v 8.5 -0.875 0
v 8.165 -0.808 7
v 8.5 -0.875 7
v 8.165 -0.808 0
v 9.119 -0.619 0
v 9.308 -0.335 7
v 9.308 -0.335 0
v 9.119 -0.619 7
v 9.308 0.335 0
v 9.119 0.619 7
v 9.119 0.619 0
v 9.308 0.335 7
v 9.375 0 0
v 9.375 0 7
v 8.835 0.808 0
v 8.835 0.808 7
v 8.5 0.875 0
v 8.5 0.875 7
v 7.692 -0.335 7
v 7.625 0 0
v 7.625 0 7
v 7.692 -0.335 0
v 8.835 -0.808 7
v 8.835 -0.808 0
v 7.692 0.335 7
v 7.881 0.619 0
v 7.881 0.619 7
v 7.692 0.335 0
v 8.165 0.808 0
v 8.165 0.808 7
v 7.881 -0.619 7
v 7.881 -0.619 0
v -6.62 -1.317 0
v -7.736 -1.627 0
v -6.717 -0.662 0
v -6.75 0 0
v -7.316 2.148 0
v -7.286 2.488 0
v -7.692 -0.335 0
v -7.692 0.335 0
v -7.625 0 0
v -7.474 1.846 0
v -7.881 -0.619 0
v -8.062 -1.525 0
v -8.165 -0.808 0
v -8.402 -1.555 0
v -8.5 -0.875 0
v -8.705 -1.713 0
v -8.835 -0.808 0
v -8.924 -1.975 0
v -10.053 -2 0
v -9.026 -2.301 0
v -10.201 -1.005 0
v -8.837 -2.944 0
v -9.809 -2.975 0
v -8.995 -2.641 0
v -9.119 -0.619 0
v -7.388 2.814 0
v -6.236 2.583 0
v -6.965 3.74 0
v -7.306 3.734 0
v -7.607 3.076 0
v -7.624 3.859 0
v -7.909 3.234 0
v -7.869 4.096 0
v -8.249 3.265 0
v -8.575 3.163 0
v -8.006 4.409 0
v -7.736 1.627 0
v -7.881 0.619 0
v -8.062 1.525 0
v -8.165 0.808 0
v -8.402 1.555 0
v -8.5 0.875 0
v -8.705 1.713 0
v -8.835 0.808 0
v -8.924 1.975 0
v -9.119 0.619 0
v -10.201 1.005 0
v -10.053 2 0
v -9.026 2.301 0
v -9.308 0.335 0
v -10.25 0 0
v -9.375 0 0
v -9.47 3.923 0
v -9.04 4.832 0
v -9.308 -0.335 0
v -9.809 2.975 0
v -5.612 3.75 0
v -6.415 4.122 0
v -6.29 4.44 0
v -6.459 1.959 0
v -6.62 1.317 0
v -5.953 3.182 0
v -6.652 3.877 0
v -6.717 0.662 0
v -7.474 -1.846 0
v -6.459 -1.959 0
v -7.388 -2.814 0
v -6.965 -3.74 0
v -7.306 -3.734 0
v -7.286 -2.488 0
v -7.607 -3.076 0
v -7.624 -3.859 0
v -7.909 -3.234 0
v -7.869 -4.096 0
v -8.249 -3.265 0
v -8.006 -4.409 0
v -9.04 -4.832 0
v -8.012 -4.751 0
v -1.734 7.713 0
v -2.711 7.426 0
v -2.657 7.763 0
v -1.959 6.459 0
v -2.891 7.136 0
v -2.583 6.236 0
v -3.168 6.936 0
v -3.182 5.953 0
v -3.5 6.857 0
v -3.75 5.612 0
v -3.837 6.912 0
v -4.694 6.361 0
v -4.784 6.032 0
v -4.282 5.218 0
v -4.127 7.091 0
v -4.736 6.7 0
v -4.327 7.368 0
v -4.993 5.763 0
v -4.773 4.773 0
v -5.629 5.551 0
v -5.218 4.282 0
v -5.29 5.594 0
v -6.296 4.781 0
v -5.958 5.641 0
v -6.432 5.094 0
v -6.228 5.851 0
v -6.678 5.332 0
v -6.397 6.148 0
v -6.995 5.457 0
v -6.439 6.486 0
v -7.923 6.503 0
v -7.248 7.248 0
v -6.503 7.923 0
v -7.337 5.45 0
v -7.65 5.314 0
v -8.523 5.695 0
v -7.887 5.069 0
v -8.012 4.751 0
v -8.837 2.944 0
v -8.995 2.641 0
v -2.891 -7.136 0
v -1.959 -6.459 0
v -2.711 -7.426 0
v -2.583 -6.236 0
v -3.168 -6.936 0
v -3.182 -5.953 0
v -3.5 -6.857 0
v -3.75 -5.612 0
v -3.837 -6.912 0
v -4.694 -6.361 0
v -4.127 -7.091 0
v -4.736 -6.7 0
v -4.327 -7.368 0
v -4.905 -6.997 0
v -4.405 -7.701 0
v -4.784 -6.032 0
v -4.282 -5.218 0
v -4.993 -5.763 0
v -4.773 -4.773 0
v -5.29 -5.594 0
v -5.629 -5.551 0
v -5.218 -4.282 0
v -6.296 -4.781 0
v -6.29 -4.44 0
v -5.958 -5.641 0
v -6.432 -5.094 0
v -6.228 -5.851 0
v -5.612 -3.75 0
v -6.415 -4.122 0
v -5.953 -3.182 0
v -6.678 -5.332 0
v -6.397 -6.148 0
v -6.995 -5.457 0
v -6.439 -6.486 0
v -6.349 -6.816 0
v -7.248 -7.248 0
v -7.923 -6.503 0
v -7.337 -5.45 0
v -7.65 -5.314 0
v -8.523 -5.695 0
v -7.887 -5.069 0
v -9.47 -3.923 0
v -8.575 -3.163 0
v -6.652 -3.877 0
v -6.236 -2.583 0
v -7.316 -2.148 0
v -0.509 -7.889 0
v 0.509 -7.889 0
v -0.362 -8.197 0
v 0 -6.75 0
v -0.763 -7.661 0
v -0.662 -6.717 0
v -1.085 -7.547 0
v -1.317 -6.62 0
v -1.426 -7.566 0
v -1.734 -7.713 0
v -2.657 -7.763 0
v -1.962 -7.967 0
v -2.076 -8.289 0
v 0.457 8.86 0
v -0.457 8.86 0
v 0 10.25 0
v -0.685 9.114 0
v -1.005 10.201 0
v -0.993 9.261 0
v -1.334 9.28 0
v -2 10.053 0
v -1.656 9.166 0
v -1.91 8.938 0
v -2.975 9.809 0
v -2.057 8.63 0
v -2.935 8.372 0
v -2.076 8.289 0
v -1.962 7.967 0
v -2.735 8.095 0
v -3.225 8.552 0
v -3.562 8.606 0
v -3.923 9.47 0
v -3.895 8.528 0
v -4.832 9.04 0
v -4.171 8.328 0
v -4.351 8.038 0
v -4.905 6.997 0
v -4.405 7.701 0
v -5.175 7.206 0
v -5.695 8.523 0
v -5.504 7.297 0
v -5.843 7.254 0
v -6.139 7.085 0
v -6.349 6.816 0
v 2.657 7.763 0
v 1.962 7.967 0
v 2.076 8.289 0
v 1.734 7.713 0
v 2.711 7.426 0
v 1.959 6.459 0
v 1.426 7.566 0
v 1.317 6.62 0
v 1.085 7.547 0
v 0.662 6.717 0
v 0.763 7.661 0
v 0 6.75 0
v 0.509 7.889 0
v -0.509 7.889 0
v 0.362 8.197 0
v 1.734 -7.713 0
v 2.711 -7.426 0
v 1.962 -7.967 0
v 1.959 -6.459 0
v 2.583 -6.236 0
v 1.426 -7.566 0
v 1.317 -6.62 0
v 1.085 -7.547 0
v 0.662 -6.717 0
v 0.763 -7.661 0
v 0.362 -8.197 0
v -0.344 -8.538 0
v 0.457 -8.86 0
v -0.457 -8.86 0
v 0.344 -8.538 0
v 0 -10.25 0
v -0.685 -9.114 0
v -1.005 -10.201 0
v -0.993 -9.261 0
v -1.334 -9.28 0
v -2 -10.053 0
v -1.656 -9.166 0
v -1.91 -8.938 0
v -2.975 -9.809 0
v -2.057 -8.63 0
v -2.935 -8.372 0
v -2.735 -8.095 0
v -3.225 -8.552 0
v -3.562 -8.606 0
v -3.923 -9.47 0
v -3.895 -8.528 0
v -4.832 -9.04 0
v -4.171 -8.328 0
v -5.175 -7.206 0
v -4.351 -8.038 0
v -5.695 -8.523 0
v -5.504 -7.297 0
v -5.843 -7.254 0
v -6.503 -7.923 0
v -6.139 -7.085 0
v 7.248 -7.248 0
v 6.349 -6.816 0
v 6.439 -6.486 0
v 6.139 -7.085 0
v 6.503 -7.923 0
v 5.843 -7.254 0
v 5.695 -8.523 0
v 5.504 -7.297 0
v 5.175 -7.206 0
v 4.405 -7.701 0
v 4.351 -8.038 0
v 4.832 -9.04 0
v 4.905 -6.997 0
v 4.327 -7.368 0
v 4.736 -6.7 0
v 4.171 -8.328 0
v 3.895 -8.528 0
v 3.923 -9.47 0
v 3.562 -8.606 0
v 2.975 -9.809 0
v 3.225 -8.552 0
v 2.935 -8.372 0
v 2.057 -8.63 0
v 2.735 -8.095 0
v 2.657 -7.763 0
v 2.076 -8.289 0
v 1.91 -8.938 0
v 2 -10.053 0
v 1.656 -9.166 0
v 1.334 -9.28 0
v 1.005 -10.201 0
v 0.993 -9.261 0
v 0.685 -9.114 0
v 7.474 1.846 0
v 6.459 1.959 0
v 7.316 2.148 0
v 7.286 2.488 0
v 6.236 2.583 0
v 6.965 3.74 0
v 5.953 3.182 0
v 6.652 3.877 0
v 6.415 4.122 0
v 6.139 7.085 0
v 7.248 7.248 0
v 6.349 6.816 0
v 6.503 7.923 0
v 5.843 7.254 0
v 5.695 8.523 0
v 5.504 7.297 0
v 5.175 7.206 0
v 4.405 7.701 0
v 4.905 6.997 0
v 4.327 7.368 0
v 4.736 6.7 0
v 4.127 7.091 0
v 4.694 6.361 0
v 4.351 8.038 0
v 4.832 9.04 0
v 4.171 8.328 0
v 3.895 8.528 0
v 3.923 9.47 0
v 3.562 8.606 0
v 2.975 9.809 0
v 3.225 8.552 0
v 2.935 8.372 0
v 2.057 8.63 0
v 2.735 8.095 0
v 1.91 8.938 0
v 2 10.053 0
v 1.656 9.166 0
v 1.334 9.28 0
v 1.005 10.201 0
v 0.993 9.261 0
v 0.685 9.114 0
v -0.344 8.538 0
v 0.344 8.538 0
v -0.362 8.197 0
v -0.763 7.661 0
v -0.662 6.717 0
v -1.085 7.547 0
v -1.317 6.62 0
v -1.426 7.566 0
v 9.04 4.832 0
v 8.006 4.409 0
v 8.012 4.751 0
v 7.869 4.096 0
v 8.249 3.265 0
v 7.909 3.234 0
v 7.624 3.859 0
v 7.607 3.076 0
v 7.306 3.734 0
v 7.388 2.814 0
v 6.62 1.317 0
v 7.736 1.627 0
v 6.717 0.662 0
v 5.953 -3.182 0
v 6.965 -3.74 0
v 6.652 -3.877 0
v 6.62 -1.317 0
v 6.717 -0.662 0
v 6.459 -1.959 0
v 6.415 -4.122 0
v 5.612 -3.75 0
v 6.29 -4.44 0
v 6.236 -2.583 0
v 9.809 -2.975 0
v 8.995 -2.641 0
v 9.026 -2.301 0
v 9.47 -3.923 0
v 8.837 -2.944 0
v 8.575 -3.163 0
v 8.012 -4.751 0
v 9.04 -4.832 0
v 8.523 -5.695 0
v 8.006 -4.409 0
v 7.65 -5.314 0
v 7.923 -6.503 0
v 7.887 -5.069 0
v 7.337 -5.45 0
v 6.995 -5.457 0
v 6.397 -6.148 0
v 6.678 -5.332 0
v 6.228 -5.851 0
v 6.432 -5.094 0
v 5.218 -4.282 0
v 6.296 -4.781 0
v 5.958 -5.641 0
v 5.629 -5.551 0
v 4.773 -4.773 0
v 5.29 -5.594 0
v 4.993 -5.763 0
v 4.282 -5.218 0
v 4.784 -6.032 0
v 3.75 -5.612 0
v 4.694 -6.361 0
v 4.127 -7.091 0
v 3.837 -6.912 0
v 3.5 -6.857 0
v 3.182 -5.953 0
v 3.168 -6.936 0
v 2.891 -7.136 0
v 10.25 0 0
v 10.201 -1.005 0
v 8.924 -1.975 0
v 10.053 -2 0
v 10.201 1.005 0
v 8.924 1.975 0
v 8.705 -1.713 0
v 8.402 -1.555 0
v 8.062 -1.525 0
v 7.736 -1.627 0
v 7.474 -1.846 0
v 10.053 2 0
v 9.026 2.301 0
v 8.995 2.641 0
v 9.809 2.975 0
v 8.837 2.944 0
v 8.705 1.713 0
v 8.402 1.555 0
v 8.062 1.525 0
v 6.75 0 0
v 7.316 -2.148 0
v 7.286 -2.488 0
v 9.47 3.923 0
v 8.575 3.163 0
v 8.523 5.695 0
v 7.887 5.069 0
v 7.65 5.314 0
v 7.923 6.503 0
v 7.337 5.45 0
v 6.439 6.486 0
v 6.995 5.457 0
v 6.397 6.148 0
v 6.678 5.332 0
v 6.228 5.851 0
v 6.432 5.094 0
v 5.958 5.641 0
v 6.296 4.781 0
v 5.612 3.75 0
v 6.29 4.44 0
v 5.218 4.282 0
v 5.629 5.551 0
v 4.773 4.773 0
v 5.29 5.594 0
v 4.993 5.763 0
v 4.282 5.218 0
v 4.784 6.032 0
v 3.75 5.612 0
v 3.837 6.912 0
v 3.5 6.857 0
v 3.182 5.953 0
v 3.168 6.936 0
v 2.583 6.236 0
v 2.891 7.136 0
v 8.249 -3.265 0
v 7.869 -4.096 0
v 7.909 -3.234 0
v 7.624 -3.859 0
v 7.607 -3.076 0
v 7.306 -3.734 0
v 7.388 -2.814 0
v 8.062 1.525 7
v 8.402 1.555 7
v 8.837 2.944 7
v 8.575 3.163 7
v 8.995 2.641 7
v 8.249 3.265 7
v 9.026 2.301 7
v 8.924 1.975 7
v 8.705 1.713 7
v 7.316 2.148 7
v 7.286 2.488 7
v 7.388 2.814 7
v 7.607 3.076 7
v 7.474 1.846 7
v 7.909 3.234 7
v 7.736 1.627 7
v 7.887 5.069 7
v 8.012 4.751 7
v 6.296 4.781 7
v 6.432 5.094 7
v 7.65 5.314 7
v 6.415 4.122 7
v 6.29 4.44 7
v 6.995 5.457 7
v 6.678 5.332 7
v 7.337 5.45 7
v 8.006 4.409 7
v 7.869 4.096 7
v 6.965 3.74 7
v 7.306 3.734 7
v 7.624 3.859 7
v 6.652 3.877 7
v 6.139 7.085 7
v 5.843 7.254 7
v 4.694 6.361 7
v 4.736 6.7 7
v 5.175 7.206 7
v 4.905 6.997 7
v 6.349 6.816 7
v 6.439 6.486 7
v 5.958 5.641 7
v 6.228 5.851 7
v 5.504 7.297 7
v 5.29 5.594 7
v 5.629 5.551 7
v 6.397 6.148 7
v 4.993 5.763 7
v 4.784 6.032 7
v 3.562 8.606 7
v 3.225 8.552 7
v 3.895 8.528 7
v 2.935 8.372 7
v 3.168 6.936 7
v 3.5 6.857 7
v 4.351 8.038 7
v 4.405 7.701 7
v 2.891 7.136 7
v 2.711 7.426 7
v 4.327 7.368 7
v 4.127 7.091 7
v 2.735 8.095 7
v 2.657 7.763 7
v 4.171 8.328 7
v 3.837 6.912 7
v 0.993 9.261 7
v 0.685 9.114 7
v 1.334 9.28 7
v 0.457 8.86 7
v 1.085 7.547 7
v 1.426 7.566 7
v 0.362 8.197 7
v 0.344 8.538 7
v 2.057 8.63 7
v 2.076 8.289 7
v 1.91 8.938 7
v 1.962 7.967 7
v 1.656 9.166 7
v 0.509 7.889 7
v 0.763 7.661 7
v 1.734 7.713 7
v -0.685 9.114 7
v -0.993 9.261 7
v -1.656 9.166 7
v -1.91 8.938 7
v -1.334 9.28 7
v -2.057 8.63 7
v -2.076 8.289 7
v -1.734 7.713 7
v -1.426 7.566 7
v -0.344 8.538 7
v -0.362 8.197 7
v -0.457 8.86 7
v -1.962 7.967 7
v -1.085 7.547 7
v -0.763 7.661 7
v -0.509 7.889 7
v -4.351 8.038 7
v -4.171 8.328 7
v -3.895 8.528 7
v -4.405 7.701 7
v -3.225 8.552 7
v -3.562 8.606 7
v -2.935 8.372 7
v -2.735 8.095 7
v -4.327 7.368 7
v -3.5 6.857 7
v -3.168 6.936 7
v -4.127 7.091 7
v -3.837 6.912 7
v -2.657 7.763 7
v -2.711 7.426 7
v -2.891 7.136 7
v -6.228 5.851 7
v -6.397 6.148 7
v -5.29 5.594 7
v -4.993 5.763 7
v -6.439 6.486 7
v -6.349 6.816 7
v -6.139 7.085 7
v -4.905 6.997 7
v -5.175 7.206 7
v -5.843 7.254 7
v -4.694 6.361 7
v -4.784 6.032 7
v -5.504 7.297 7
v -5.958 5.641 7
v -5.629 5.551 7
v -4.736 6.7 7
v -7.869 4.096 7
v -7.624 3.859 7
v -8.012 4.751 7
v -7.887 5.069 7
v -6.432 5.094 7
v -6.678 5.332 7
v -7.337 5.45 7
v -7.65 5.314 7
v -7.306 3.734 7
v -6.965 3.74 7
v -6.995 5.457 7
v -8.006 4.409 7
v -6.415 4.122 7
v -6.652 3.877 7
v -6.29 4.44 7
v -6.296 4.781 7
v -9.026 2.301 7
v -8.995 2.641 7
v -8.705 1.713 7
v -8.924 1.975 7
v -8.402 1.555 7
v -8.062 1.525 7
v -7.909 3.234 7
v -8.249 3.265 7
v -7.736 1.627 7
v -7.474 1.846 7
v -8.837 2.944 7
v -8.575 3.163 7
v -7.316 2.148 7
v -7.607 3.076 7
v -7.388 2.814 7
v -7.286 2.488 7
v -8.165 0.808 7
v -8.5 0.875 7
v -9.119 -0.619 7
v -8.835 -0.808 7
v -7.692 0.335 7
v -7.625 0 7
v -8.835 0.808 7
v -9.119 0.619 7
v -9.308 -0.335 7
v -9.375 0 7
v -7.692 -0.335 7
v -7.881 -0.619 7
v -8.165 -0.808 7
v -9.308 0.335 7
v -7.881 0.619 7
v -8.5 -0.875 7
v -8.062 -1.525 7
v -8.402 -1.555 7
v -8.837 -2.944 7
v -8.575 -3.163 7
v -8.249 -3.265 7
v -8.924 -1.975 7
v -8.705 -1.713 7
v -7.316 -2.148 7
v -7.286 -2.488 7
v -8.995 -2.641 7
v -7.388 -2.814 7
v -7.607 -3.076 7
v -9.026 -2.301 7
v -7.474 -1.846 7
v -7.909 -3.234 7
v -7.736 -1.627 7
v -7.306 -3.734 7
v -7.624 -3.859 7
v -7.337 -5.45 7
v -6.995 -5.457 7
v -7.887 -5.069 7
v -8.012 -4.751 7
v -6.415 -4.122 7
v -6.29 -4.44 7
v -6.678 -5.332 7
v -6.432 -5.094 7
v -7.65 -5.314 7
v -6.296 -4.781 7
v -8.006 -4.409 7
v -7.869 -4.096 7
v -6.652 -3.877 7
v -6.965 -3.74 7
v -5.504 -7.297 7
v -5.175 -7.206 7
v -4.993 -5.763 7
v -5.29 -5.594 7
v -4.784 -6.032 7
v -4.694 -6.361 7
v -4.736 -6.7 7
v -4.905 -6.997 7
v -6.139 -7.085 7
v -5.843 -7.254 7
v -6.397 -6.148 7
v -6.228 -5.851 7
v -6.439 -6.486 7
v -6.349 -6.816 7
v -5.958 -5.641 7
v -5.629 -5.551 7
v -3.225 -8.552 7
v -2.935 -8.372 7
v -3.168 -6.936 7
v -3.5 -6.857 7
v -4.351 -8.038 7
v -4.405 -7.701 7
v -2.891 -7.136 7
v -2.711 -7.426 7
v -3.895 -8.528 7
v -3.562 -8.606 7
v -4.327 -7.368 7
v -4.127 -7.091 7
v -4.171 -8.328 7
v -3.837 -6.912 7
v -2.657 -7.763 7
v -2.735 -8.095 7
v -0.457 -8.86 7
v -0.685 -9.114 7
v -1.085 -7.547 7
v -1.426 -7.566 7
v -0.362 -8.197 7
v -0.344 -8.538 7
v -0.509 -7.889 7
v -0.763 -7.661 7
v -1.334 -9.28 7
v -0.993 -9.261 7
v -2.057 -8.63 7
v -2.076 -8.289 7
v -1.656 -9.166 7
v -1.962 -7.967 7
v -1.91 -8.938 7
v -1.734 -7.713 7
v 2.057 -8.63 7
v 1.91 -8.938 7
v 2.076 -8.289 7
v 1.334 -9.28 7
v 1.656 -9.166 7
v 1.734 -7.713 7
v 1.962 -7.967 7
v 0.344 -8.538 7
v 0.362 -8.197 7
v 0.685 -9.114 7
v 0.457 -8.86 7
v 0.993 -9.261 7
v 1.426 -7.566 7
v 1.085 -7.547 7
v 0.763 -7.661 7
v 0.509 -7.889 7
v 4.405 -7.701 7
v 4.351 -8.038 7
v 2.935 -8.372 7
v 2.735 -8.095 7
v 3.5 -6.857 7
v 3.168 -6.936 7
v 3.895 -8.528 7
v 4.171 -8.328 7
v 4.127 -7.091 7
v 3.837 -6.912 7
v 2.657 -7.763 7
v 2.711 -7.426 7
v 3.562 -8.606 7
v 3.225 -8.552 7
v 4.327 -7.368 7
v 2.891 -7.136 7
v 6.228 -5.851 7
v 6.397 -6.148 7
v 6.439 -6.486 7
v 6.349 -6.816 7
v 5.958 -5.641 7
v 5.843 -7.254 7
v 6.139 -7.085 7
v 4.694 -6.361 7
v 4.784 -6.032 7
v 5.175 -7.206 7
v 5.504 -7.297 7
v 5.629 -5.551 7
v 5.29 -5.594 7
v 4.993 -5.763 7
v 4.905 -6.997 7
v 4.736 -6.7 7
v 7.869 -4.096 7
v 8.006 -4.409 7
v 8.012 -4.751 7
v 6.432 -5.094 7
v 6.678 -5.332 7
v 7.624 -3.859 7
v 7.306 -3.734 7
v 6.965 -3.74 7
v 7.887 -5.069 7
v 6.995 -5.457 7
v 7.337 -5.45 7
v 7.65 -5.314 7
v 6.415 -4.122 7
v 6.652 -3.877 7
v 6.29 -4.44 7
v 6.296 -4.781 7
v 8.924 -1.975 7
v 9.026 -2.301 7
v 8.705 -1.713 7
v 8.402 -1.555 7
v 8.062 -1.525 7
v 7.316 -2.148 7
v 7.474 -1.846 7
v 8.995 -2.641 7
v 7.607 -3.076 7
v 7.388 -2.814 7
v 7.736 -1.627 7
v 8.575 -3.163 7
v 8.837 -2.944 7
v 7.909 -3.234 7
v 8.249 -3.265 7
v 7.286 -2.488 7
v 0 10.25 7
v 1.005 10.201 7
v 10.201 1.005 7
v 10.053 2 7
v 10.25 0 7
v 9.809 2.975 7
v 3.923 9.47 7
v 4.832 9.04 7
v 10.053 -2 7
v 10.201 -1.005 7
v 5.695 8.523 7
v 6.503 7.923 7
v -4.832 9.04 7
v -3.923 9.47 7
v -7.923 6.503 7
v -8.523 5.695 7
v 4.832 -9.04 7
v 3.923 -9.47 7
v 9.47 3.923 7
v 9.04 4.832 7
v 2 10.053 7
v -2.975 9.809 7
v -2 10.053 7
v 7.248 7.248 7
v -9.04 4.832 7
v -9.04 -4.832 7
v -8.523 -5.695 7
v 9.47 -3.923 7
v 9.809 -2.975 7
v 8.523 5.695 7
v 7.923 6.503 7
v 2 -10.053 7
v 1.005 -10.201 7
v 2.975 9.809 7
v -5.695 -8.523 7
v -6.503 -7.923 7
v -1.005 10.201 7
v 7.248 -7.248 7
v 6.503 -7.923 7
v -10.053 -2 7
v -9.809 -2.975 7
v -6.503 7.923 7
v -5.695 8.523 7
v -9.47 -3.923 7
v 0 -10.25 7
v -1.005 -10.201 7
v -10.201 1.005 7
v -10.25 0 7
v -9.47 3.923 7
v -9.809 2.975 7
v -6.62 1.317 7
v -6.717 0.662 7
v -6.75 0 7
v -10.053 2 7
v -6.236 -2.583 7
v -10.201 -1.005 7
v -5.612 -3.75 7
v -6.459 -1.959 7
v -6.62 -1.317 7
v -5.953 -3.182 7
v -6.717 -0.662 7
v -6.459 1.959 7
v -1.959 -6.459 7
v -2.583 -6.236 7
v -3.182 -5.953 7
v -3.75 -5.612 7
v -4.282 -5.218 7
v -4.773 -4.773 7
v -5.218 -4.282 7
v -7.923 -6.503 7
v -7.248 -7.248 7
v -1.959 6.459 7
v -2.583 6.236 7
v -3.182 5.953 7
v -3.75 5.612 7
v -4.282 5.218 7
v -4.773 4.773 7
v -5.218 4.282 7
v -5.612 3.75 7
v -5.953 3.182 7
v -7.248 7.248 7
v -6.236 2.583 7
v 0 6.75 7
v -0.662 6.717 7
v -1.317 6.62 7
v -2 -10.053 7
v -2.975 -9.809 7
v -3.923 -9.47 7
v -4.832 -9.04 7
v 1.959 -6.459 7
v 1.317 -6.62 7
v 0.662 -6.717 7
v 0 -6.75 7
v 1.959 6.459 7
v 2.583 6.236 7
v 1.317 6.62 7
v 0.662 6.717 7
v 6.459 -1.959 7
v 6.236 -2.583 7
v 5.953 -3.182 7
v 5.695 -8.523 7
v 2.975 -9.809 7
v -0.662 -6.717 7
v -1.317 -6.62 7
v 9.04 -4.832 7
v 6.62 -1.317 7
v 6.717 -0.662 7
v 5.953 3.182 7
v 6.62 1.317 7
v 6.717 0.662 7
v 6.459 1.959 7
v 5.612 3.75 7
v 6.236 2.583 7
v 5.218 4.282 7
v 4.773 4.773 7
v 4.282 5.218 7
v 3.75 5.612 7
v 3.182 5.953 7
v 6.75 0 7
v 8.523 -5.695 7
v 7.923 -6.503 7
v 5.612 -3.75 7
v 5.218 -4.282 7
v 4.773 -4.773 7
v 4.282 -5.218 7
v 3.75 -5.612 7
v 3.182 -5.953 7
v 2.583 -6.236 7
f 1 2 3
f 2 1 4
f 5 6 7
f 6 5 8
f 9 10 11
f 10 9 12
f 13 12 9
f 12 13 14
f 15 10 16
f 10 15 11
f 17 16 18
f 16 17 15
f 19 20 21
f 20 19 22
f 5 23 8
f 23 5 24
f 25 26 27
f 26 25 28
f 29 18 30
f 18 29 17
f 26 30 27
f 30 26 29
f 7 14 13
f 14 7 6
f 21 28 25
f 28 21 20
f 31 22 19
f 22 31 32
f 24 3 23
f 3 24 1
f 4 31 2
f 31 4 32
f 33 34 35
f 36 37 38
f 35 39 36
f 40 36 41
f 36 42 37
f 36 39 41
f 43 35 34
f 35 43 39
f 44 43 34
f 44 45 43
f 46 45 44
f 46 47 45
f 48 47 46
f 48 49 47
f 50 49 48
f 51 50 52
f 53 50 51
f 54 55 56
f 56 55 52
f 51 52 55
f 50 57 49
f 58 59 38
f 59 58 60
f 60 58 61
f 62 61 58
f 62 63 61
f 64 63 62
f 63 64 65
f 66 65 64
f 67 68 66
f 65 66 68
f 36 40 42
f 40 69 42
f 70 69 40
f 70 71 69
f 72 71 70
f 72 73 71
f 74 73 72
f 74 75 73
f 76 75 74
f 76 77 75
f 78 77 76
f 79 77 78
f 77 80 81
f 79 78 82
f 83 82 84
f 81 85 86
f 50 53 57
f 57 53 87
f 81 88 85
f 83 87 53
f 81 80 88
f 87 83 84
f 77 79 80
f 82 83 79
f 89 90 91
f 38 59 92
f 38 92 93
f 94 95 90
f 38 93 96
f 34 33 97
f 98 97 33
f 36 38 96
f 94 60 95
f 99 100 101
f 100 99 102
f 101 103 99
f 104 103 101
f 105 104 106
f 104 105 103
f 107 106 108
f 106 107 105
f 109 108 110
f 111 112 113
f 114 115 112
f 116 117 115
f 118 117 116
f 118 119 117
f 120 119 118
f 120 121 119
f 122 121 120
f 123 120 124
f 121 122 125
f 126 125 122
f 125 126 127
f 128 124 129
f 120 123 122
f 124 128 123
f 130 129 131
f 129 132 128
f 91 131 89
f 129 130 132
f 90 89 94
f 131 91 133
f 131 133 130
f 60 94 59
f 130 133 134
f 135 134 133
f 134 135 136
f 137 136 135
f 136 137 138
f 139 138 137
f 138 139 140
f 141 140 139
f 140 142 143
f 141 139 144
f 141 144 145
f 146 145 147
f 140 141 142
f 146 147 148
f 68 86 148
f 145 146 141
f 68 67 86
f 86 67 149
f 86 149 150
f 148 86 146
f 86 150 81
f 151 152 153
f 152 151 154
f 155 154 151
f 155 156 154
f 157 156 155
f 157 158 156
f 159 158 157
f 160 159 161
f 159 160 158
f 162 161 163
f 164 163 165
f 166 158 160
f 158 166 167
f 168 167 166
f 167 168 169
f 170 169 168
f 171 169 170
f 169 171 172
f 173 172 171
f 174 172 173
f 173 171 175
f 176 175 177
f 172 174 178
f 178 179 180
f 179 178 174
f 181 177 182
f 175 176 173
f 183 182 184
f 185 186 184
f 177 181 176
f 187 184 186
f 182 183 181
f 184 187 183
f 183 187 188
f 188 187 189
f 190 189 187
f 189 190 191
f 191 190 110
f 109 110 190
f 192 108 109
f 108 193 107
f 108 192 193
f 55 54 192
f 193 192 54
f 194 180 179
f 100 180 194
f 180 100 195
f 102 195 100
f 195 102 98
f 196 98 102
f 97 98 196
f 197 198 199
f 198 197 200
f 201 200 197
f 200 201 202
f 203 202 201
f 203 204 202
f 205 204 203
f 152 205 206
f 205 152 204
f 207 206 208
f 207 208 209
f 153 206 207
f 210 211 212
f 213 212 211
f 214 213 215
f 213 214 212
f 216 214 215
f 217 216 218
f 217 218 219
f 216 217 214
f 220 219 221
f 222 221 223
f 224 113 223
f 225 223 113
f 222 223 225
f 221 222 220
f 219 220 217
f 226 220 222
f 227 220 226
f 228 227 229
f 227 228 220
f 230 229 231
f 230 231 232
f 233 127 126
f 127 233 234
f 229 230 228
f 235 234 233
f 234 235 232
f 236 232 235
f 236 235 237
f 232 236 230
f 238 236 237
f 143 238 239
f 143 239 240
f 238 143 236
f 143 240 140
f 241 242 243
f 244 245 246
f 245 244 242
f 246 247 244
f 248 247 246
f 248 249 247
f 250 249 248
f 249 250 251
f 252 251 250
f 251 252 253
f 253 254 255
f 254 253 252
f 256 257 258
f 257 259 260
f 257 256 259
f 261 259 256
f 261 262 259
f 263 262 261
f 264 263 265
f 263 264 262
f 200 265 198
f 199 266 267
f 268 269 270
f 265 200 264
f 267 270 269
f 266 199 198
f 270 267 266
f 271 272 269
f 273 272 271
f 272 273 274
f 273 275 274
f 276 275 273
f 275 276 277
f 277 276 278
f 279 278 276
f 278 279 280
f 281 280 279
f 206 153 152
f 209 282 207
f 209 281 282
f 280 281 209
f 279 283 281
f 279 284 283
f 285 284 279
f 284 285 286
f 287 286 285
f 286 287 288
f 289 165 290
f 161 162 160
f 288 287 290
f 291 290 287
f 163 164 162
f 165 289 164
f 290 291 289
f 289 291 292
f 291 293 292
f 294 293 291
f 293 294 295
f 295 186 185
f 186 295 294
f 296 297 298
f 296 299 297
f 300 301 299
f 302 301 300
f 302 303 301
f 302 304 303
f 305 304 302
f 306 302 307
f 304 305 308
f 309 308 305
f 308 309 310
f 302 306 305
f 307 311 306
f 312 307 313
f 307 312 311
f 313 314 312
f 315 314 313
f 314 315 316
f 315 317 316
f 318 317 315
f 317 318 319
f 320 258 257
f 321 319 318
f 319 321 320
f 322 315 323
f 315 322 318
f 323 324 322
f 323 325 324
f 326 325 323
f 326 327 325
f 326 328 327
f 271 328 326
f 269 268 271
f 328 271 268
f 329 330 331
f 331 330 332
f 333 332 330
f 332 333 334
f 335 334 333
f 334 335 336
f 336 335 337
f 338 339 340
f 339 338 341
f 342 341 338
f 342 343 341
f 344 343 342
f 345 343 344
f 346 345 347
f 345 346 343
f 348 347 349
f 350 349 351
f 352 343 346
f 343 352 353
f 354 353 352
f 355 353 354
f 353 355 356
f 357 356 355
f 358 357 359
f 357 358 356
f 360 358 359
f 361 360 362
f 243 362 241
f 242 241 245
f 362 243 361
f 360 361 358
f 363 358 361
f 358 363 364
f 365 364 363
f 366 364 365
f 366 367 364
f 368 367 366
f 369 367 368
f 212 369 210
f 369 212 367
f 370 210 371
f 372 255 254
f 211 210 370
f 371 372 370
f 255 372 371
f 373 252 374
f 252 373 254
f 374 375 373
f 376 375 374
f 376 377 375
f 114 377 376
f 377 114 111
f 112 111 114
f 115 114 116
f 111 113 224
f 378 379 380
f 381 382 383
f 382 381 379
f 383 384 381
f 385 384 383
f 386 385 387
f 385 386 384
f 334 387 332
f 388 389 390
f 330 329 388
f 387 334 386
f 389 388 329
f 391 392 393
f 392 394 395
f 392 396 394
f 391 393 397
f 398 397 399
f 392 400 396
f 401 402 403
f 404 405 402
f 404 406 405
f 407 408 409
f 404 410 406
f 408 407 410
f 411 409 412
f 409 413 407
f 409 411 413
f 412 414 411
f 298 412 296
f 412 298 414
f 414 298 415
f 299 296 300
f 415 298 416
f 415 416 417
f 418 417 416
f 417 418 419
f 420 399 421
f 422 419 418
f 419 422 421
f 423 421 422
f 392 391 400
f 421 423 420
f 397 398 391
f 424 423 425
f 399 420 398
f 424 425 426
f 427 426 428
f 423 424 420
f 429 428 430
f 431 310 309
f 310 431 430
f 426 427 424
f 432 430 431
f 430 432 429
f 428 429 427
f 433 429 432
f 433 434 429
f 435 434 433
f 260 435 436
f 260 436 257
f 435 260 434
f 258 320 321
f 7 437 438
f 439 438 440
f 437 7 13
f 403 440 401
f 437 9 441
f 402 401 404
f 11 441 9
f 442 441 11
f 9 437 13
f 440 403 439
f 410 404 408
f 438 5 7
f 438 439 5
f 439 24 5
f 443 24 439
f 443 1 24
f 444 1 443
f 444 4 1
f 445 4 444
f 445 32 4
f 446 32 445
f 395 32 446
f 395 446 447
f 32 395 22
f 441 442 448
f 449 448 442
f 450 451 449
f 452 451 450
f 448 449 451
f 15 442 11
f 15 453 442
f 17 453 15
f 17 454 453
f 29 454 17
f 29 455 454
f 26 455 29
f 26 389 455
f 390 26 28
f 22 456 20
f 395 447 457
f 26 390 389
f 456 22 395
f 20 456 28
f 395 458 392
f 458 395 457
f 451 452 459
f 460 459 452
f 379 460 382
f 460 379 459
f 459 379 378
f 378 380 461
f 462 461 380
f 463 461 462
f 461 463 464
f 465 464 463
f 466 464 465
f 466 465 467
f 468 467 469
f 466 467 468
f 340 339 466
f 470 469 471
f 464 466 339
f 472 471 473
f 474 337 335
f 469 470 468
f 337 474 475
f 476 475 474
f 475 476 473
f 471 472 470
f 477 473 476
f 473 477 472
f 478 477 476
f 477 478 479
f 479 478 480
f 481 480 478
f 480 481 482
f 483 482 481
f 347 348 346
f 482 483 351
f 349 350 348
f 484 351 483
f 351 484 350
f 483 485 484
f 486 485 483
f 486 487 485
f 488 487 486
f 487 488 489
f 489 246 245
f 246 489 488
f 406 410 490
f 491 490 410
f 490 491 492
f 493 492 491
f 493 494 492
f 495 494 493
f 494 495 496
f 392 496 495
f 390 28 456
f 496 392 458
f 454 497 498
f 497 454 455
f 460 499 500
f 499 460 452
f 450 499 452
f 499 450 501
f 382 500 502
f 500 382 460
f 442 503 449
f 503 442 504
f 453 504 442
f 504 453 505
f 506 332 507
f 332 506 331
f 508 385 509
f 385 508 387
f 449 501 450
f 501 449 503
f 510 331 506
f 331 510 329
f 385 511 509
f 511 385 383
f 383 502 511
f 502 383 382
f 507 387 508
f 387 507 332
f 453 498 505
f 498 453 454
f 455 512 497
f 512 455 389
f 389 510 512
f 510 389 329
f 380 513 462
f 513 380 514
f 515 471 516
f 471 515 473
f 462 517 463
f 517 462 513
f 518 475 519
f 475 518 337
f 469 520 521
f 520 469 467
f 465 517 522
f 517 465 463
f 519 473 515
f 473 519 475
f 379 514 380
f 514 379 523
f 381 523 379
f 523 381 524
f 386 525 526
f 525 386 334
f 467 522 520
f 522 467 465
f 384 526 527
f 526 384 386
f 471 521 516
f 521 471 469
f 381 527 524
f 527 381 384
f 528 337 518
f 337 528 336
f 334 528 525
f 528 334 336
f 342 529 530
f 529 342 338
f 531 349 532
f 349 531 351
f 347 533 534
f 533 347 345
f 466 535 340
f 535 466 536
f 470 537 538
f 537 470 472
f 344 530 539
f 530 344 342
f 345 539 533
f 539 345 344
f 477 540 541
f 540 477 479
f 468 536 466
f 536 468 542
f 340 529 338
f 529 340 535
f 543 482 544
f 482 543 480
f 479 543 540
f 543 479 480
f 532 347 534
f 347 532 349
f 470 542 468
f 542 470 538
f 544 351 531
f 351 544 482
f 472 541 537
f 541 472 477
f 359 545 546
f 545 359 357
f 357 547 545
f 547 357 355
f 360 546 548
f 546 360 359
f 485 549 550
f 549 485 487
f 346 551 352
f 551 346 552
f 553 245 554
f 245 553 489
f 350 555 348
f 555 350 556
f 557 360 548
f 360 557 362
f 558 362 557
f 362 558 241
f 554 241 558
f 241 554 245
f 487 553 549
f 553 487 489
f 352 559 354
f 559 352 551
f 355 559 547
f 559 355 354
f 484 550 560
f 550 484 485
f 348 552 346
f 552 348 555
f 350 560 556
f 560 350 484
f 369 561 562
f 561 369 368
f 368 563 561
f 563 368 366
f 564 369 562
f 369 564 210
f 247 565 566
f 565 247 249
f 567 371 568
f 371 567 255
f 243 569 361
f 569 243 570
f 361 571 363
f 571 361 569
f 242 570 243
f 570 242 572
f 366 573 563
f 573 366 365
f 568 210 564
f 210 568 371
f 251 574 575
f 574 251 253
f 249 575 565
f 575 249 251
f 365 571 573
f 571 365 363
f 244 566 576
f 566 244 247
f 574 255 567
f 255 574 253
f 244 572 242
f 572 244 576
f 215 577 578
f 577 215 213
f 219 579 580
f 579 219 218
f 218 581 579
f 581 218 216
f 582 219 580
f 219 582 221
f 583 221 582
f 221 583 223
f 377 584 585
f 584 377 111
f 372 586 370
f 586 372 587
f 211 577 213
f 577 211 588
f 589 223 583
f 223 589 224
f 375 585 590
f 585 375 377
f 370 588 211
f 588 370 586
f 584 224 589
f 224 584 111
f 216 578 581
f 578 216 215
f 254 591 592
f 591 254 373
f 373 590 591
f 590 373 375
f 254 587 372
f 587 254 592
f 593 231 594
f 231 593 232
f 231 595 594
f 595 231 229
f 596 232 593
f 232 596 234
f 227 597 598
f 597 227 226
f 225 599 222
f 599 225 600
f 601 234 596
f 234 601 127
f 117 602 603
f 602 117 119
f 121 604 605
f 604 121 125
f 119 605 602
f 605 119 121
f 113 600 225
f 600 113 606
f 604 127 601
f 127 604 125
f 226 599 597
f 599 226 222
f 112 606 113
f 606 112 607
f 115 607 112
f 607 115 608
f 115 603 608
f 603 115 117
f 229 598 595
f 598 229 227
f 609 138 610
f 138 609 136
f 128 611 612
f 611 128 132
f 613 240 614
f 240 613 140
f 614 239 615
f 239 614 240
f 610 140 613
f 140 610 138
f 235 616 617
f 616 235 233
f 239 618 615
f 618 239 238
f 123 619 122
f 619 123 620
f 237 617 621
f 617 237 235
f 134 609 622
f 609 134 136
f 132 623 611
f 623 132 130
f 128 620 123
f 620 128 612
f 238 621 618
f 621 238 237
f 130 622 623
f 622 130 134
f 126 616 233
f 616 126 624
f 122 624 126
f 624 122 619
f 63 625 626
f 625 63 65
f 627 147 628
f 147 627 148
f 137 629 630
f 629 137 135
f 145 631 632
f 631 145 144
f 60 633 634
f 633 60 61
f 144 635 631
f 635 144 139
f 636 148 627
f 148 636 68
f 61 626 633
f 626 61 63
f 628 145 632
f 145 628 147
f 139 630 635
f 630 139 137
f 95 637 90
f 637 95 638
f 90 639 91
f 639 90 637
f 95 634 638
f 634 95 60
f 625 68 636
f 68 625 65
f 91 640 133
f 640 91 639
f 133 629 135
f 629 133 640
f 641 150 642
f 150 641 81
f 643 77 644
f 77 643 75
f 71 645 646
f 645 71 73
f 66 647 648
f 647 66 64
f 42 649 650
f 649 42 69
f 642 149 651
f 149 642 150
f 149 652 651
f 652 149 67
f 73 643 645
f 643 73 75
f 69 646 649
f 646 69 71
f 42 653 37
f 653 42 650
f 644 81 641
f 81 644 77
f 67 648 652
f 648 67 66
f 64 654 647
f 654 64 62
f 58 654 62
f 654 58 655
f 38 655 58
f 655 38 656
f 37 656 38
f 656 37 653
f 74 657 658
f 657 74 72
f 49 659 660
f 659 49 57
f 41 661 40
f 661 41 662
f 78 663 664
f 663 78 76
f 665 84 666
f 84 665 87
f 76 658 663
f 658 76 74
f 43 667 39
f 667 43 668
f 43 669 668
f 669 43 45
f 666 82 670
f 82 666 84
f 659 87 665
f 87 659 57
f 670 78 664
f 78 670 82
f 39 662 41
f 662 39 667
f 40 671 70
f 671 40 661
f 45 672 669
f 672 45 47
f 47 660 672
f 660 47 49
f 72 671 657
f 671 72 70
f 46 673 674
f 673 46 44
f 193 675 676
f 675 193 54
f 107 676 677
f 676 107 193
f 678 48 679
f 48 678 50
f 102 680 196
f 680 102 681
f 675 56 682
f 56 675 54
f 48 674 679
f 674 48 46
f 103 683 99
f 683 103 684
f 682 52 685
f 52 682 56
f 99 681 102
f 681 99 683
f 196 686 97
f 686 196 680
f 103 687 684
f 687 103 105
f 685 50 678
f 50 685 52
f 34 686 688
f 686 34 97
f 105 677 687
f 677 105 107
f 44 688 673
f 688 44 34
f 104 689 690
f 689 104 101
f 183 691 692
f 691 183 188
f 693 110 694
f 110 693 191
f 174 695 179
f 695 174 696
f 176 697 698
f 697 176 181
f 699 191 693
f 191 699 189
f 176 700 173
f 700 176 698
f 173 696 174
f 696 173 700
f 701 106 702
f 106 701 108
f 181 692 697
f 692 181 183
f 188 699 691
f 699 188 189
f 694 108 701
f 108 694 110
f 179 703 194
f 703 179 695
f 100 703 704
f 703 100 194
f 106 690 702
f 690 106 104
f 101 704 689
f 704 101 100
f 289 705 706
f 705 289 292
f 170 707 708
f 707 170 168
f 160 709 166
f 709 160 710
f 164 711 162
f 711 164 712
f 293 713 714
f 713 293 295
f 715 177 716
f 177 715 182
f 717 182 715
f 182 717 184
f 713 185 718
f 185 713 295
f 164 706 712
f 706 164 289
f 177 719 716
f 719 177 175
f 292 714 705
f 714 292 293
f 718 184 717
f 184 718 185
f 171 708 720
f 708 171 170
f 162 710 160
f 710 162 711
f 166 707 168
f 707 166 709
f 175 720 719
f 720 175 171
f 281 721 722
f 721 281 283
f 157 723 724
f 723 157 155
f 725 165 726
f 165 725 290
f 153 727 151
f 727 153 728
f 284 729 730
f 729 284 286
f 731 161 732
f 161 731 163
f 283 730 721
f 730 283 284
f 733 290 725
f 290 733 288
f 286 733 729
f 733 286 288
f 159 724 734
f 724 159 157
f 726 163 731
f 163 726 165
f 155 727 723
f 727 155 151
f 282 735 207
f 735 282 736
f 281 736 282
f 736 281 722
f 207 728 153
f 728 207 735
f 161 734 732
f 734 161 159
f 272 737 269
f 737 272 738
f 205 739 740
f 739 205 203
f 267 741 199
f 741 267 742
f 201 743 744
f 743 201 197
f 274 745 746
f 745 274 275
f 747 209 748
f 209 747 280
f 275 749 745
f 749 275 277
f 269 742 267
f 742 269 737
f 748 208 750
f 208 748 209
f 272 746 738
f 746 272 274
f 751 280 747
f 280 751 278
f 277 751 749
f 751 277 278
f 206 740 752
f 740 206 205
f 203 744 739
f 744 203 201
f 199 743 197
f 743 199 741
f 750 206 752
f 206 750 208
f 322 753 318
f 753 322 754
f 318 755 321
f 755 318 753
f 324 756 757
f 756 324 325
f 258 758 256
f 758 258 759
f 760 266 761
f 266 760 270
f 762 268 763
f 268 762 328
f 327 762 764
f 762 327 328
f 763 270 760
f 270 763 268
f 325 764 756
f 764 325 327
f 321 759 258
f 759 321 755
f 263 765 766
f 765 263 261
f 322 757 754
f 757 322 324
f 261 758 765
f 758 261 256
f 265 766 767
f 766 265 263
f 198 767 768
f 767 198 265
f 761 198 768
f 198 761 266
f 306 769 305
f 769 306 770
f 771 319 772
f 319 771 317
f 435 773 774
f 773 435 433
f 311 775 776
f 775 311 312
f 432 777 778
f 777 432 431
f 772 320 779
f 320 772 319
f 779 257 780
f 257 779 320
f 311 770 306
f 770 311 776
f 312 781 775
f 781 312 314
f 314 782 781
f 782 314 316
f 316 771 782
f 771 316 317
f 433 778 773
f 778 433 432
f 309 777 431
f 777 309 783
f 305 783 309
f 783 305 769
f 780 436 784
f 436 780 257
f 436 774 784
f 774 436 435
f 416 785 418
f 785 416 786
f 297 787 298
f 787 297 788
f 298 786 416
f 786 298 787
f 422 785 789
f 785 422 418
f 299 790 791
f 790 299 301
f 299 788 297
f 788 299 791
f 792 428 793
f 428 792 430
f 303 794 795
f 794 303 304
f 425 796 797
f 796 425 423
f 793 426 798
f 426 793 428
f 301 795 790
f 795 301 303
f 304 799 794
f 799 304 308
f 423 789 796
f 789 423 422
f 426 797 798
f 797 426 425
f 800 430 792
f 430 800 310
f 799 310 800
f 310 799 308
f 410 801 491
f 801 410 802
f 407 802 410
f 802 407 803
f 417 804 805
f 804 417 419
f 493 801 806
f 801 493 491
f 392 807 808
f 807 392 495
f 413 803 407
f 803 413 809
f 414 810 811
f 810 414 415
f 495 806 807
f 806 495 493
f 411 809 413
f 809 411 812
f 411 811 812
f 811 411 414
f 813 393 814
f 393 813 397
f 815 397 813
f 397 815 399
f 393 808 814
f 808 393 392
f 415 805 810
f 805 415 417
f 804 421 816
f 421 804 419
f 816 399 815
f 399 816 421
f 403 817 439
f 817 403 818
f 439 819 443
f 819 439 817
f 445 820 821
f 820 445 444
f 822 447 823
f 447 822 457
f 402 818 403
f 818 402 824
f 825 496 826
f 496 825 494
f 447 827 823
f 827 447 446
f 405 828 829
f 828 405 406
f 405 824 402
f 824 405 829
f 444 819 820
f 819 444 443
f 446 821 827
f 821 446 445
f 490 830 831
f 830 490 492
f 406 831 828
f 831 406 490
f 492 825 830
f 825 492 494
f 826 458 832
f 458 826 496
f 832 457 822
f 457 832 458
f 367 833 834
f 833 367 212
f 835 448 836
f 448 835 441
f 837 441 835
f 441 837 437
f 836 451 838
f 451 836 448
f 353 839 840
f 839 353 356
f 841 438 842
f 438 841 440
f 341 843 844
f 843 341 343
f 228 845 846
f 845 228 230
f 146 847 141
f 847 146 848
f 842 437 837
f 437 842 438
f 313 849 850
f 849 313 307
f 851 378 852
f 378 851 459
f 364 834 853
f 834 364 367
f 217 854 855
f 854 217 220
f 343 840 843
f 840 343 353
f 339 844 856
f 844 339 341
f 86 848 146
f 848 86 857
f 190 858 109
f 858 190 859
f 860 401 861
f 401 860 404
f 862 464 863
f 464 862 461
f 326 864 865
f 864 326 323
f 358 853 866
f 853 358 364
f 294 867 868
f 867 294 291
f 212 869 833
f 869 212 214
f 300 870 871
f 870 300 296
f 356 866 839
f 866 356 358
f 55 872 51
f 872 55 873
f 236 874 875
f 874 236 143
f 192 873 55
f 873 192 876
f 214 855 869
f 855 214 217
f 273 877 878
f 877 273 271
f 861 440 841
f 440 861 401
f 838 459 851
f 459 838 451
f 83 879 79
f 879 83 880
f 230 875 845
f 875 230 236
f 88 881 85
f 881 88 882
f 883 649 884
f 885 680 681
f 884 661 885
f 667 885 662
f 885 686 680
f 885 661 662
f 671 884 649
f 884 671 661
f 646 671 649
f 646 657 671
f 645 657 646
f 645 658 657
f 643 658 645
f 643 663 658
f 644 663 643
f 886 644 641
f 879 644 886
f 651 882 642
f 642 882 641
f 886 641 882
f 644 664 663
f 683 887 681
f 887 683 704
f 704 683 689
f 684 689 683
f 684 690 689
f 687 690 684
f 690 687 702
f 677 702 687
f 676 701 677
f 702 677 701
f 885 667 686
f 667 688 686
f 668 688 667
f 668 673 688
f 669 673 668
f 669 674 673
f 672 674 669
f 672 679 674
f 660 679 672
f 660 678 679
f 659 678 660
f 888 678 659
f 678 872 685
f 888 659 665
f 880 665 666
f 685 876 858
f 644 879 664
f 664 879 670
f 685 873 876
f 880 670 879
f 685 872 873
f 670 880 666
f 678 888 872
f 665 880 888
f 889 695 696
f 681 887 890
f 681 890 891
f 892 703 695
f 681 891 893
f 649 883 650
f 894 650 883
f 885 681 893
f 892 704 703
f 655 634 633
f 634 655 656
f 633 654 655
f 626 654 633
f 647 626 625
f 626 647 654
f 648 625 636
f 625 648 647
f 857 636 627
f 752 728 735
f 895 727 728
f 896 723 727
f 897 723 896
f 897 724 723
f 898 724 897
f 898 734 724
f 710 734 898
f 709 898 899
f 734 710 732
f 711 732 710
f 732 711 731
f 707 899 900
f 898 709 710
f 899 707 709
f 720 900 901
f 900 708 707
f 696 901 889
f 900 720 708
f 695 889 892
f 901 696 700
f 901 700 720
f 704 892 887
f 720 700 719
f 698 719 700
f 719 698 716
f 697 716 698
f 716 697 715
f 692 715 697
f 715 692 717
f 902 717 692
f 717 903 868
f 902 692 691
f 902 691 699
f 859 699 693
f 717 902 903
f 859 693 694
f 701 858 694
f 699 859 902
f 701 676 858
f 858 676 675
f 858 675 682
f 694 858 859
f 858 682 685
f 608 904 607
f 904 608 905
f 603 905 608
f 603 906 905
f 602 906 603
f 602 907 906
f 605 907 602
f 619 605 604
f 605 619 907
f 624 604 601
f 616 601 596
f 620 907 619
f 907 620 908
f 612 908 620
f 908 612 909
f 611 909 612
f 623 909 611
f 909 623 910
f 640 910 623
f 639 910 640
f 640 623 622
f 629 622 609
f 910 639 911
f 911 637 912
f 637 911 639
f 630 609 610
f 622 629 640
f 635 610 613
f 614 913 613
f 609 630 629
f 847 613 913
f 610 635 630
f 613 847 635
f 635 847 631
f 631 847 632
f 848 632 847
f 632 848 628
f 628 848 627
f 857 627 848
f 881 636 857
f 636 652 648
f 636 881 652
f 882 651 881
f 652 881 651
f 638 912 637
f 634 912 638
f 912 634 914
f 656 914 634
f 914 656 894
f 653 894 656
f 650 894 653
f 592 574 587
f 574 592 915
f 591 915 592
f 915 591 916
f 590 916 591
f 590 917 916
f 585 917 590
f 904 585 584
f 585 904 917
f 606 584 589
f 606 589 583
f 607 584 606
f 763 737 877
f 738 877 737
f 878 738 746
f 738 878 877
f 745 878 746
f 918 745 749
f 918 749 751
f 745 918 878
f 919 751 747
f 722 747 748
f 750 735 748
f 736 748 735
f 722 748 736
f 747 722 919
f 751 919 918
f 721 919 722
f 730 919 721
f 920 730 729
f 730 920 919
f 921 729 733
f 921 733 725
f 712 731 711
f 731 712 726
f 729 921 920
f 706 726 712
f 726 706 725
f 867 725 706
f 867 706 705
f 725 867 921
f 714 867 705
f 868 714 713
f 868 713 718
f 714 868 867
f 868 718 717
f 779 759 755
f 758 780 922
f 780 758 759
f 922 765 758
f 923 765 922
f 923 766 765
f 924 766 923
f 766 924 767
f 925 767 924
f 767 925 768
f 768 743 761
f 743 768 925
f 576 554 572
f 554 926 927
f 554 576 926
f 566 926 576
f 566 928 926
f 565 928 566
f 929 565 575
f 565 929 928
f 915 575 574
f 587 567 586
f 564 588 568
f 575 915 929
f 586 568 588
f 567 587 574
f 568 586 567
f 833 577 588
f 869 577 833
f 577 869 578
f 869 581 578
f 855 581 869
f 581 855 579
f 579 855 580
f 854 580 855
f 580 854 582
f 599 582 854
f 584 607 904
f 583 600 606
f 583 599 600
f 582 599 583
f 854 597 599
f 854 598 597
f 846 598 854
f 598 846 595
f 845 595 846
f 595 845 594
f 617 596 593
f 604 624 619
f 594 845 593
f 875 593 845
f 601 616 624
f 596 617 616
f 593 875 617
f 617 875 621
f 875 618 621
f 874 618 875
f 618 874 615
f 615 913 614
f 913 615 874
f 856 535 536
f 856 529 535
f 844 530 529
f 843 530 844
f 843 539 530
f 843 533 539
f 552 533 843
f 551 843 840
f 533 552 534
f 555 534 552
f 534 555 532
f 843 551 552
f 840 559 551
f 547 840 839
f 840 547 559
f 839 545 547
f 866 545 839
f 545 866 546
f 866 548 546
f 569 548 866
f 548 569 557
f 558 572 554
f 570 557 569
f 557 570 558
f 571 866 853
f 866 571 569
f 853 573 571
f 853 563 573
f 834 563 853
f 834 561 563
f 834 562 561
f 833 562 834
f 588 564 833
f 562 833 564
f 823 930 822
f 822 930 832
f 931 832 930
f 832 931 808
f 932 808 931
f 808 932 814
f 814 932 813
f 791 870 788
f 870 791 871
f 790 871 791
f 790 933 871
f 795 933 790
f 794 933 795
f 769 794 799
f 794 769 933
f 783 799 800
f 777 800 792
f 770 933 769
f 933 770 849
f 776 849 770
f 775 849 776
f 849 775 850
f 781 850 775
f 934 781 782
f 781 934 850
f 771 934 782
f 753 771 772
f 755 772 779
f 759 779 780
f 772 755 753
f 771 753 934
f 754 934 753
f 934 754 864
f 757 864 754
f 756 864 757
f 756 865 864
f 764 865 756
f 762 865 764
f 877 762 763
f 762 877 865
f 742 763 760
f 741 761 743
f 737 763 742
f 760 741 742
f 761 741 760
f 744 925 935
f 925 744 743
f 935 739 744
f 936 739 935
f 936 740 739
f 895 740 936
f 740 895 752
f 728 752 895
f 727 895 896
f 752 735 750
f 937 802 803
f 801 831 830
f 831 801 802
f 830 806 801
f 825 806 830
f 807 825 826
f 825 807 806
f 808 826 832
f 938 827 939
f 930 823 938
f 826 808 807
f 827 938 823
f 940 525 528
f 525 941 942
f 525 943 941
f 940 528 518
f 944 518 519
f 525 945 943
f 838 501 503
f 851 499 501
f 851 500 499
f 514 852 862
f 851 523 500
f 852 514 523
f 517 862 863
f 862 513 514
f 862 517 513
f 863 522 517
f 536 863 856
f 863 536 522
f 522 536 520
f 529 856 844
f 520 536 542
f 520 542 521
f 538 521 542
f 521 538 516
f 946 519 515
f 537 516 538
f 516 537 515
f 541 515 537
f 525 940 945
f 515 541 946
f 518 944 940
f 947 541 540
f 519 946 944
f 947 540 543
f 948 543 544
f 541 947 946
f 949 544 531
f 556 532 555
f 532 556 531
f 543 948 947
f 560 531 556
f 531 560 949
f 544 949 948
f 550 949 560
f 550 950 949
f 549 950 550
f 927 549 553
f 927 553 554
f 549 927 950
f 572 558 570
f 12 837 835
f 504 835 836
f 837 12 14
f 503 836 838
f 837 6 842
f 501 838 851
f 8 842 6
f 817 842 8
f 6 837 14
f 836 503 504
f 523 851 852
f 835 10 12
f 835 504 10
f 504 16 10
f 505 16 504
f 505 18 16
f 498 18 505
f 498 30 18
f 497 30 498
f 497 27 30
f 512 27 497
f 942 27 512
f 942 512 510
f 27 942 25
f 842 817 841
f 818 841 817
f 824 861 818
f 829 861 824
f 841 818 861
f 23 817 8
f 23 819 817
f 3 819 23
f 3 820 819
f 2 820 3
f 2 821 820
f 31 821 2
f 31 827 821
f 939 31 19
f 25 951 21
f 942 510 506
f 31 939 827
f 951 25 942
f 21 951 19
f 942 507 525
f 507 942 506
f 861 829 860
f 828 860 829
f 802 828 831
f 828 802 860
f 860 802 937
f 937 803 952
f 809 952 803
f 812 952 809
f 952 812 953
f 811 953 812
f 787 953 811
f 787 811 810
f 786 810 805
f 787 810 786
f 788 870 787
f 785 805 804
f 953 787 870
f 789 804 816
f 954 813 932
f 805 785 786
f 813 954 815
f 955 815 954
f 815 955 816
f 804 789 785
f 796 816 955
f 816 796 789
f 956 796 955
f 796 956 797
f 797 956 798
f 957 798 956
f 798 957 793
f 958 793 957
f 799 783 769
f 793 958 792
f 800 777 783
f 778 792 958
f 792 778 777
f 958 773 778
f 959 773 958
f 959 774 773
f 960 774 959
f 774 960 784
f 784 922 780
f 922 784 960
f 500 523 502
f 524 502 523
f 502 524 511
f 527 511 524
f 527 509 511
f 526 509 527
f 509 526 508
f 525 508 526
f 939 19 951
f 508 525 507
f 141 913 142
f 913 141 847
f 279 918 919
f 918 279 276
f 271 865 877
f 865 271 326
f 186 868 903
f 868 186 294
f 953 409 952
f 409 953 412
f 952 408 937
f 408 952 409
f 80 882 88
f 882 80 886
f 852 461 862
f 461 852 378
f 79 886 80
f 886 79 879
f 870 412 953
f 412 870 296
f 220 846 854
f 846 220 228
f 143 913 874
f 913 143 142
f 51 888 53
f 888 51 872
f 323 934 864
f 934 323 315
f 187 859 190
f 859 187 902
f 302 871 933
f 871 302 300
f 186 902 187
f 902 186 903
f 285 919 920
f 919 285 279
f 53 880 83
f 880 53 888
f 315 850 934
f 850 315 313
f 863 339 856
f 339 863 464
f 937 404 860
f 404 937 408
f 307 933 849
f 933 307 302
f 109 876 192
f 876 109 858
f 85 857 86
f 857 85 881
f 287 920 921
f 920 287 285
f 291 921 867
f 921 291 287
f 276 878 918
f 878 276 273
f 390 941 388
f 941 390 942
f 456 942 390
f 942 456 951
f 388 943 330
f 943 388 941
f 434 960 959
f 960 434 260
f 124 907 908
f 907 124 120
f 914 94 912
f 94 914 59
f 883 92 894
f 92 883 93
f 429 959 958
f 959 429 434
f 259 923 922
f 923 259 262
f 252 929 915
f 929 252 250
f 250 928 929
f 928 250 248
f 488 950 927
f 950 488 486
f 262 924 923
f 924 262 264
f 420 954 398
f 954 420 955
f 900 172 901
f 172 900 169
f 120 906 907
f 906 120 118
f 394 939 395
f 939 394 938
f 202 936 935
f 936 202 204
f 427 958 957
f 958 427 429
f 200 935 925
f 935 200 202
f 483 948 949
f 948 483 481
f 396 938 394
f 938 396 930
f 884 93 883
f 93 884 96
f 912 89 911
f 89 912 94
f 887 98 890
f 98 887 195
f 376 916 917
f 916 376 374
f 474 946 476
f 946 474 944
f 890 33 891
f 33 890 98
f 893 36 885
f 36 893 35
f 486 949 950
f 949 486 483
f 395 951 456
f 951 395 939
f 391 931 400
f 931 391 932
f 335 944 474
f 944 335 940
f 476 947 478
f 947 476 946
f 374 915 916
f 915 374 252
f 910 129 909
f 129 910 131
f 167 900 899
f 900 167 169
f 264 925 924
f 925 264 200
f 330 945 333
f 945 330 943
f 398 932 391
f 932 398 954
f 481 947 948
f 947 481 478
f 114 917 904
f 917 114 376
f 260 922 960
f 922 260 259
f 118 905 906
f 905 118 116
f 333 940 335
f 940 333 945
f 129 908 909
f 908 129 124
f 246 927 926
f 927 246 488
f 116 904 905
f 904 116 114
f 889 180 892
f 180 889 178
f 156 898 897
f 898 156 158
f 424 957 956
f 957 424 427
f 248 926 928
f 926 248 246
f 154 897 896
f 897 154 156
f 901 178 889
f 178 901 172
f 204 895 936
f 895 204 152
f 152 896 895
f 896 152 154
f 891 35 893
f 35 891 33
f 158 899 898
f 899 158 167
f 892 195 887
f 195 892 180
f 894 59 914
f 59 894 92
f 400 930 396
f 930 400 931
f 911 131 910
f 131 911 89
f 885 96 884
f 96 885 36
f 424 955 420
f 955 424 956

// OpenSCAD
// [FL_INDEX: keywords="openscad, 3d_parametric, Parametric_vacuum_tube_socket, csg_solid" | COT="Parametric OpenSCAD design from 3DCodeverse"]
// Title: Parametric vacuum tube socket

pin_ring_diameter=17;
pin_size=1.75;
pin_count=22;
height=7;

difference()
{
cylinder(r=(pin_ring_diameter/2)+(2*(pin_size/2)),h=height,$fn=64);

cylinder(r=(pin_ring_diameter/2)-(2*(pin_size/2)),h=height+1,$fn=64);

for (i=[0:(360/pin_count):360])
{
	rotate([0,0,i])
	translate([(pin_ring_diameter/2),0,0])
	cylinder(r=(pin_size/2),h=height+1, $fn=16);
}

}
